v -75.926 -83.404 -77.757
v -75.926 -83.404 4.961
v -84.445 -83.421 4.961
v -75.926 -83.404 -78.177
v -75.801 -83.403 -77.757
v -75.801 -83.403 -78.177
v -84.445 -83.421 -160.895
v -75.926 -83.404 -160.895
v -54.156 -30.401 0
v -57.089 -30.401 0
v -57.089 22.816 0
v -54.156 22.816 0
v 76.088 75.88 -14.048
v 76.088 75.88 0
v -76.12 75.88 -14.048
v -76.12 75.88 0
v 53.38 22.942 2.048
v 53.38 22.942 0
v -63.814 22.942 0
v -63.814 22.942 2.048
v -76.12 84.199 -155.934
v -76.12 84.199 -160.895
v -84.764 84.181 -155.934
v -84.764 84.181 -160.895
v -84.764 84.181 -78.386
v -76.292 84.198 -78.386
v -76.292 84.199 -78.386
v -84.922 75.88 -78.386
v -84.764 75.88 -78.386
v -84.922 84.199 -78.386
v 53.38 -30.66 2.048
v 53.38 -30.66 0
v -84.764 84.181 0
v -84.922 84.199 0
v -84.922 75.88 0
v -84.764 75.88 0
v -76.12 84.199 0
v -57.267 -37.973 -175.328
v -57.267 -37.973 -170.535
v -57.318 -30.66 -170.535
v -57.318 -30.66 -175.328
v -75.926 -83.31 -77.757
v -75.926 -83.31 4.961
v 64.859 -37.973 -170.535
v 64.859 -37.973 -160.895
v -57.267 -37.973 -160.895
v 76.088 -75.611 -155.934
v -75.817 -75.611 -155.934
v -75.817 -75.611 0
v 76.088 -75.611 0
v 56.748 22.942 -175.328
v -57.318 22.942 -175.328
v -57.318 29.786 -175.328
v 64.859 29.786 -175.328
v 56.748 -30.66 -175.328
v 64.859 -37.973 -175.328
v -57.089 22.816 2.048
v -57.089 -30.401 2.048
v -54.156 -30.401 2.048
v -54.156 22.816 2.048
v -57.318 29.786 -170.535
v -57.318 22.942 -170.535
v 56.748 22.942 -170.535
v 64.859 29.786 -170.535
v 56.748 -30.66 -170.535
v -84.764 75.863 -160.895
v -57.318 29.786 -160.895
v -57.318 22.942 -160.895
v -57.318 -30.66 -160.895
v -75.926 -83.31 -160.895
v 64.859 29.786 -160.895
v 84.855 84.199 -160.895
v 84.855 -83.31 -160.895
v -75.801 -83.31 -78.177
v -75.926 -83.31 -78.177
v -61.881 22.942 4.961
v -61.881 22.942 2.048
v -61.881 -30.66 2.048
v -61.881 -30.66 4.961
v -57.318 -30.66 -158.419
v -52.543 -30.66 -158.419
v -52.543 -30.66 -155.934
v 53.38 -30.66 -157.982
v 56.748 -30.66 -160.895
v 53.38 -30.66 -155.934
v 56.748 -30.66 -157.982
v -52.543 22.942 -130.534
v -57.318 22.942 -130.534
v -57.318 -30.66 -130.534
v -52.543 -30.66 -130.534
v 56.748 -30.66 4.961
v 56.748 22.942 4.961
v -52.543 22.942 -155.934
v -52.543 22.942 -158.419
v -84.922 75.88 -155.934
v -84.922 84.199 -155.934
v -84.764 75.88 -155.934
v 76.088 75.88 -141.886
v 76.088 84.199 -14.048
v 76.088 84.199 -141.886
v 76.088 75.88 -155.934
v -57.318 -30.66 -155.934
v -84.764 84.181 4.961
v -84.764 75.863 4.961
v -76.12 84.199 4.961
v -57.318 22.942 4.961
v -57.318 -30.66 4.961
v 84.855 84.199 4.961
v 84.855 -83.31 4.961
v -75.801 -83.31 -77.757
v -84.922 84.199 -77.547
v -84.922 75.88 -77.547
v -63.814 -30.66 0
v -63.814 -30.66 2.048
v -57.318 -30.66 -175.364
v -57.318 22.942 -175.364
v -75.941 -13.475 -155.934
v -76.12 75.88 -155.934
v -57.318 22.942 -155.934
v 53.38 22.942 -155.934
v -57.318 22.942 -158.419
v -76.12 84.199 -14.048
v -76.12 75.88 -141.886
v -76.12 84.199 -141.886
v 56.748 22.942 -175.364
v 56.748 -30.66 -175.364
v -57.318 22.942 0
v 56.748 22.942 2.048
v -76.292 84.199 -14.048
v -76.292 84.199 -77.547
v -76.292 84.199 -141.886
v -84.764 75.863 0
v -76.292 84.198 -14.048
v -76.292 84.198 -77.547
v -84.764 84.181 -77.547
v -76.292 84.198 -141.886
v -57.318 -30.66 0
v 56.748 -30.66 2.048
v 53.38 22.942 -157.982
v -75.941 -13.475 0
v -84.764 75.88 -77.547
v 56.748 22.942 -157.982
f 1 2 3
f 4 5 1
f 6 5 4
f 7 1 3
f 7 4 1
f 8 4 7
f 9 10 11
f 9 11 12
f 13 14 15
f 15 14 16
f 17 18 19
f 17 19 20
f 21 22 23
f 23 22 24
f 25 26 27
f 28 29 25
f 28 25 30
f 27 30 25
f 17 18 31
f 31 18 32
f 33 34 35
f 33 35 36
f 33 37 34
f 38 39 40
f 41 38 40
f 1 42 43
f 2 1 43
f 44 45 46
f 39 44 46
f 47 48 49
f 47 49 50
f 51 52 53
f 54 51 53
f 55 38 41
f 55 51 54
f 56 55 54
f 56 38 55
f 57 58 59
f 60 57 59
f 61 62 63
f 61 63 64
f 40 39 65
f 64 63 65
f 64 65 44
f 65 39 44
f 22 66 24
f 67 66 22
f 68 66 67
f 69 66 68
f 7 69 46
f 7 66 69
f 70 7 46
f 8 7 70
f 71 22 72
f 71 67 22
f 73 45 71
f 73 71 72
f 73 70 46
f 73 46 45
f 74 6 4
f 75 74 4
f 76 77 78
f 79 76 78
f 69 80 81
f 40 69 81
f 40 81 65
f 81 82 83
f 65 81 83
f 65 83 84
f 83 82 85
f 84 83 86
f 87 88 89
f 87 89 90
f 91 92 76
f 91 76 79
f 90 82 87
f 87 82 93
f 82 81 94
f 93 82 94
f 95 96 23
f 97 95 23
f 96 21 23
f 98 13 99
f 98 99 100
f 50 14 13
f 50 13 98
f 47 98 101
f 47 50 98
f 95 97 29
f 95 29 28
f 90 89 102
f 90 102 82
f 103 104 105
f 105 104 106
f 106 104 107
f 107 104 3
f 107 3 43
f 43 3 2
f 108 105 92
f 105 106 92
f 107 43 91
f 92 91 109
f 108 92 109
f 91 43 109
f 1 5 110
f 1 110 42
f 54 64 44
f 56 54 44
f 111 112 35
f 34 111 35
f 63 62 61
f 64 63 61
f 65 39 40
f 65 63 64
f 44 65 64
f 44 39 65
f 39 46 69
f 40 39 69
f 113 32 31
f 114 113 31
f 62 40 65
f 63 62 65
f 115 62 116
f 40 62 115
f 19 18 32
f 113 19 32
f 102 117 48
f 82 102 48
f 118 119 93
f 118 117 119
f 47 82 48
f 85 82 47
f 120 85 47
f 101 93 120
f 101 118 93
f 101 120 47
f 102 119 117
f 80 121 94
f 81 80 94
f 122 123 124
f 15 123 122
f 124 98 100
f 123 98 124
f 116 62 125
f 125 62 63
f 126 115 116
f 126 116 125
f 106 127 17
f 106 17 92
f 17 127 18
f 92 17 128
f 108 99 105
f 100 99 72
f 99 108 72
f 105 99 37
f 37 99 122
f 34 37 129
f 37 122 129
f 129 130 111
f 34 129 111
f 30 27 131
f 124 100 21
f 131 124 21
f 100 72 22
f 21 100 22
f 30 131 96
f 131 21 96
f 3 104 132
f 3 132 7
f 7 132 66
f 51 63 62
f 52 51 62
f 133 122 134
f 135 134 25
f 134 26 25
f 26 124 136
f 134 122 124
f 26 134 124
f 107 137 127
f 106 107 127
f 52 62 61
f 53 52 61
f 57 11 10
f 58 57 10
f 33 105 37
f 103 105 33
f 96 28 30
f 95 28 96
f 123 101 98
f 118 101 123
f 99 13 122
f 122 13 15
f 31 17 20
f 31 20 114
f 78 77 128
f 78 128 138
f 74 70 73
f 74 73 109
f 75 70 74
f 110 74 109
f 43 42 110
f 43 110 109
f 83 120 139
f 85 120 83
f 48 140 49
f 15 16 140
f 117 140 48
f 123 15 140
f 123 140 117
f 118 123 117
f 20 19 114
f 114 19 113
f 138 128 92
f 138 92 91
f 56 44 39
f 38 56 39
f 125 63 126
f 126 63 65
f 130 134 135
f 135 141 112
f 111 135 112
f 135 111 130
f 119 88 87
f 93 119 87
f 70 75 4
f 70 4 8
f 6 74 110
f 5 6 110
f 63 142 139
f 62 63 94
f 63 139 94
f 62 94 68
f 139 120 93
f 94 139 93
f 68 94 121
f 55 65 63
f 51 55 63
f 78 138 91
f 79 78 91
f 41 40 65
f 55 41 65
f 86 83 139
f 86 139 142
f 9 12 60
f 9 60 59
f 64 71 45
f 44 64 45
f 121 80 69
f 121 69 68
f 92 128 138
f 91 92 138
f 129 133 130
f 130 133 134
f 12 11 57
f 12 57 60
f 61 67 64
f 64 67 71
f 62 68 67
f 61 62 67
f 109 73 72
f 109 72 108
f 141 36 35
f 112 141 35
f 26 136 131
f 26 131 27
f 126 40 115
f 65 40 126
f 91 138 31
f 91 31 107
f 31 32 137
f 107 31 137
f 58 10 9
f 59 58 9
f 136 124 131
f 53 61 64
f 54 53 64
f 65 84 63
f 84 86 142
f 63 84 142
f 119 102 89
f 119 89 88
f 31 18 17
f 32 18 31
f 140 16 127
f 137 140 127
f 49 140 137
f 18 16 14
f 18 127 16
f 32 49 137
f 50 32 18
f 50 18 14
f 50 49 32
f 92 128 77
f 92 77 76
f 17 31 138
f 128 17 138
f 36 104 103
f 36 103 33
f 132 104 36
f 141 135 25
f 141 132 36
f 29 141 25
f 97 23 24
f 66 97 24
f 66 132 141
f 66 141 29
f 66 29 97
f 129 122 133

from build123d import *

# Parameters (mm, degrees)
F1_DEPTH       = 4.9610938877
F2_DEPTH       = 36.2845510244
F3_DEPTH       = 28.2983873039
F6_W           = 152.0289778709
F6_H           = 77.9667943716
F6_H_2         = 4.9610938877
F7_DEPTH       = 7.698206231
F5_W           = 89.3552458436
F5_H           = 4.9610938877
F8_DEPTH       = 8.6439009756
F4_W           = 151.4917612076
F4_H           = 78.0786424875
F4_H_2         = 4.9610938877
F9_DEPTH       = 8.7674502283
F11_DEPTH      = 7.6351538301
F14_DEPTH      = 8.318213746
F16_W          = 2.9331818223
F16_H          = 53.2167684287
F17_DEPTH      = 2.0480365492
F15_W          = 3.3681131899
F15_H          = 53.6021273583
F19_DEPTH      = 117.1940714121
F20_DEPTH      = 118.6289340258
F22_DEPTH      = 9.6406843513
F23_W          = 114.0664964914
F23_H          = 53.6021273583
F24_DEPTH      = 4.8288311809
F25_DEPTH      = 4.7923792154
F26_W          = 4.7755762935
F26_H          = 53.6021273583
F27_DEPTH      = 2.485699486
F27_DEPTH_BACK = 25.4


with BuildPart() as f1:
    # F0 (on Top) → F1 (new body)
    with BuildSketch(Plane.XY):
        Polygon((-76.1202722788, 75.8803635836), (-75.9412050247, -13.4747028351), (-75.9412050247, -75.611397624), (76.0877728462, -75.611397624), (76.0877728462, 75.8803635836), align=None)
        Polygon((-57.3181062937, -58.9580535889), (-57.3181062937, -13.4747028351), (-57.3181062937, 59.2270120978), (56.7483901978, 59.2270120978), (56.7483901978, -58.9580535889), align=None, mode=Mode.SUBTRACT)
    extrude(amount=F1_DEPTH)

    # F2 (add): a face of the model
    f2_faces = [f1.faces().sort_by_distance(p)[0] for p in [
        (-0.284858048, 59.2270120978, 2.4805469438),
    ]]
    extrude(f2_faces, amount=F2_DEPTH)

    # F3 (add): a face of the model
    f3_faces = [f1.faces().sort_by_distance(p)[0] for p in [
        (-0.284858048, -58.9580535889, 2.4805469438),
    ]]
    extrude(f3_faces, amount=F3_DEPTH)

    # F6 (on face) → F7 (join)
    with BuildSketch(Plane.XZ.offset(75.611397624)):
        with Locations((0.0732839108, -38.9833971858)):
            Rectangle(F6_W, F6_H)
        with Locations((0.0732839108, 2.4805469438)):
            Rectangle(F6_W, F6_H_2)
    extrude(amount=F7_DEPTH)

    # F5 (on face) → F8 (join)
    with BuildSketch(Plane(origin=(-75.9679031968, -0.1522394238, 0), x_dir=(0.0020039926, -0.999997992, 0), z_dir=(-0.999997992, -0.0020039926, 0))):
        Polygon((75.6161287427, 4.9610938877), (13.3224901628, 4.9610938877), (13.3224901628, 0), (-76.0327556807, 0), (-76.0327556807, -78.1766921282), (75.6161287427, -78.1766921282), align=None)
        with Locations((-31.355132759, 2.4805469438)):
            Rectangle(F5_W, F5_H)
    extrude(amount=F8_DEPTH)

    # F4 (on face) + F7_face (on face) → F9 (join)
    with BuildSketch(Plane.YZ.offset(76.0877728462)):
        with Locations((0.1344829798, -39.0393212438)):
            Rectangle(F4_W, F4_H)
        with Locations((0.1344829798, 2.4805469438)):
            Rectangle(F4_W, F4_H_2)
    with BuildSketch(Plane(origin=(76.0877728462, -36.4227471096, -15.4241620465), x_dir=(0, 1, 0), z_dir=(1, 0, 0))):
        Polygon((112.3031106931, 15.4241620465), (112.3031106931, 20.3852559342), (-46.8868567455, 20.3852559342), (-46.8868567455, -62.5426323251), (-39.1886505145, -62.5426323251), (-39.1886505145, 15.4241620465), align=None)
    extrude(amount=F9_DEPTH)

    # F11 (add): a face of the model
    f11_faces = [f1.faces().sort_by_distance(p)[0] for p in [
        (-80.2005689479, -75.7770022516, -36.6093330754),
    ]]
    extrude(f11_faces, amount=F11_DEPTH)

    # F12 (on face) + F13 (on face) + F8_face1 (on face) → F14 (join)
    with BuildSketch(Plane(origin=(0, 75.8803635836, 0), x_dir=(-1, 0, 0), z_dir=(0, 1, 0))):
        Polygon((-76.0877728462, 0), (76.1202722788, 0), (76.1202722788, 4.9610938877), (-84.8552230746, 4.9610938877), (-84.8552230746, -78.0786424875), (-76.0877728462, -78.0786424875), align=None)
    with BuildSketch(Plane(origin=(0, 75.8803635836, 0), x_dir=(-1, 0, 0), z_dir=(0, 1, 0))):
        Polygon((76.1202722788, 0), (0, 0), (-76.0877728462, 0), (-76.0877728462, -14.047597535), (76.2922167778, -14.047597535), (76.2922167778, -77.5474458933), (84.9216878414, -77.5474458933), (84.9216878414, 0), align=None)
    with BuildSketch(Plane(origin=(-80.4422140881, 75.8717024266, -36.6077991202), x_dir=(-0.999997992, -0.0020039926, 0), z_dir=(-0.0020039926, 0.999997992, 0))):
        Polygon((4.3219504878, 41.5688930079), (-4.3219504878, 41.5688930079), (-4.3219504878, 36.6077991202), (-4.3219504878, -41.5688930079), (4.3219504878, -41.5688930079), align=None)
    extrude(amount=F14_DEPTH, dir=(0, 1, 0))

    # F15 (on face) → F17, piece 2 (join)
    with BuildSketch(Plane(origin=(0, 0, 0), x_dir=(1, 0, 0), z_dir=(0, 0, -1))):
        with Locations((55.0643336028, 3.8586026058)):
            Rectangle(F15_W, F15_H)
    extrude(amount=-F17_DEPTH)

    # F18: F1 across face


with BuildPart() as f17:
    # F16 (on face) → F17 (new body)
    with BuildSketch(Plane(origin=(0, 0, 0), x_dir=(1, 0, 0), z_dir=(0, 0, -1))):
        with Locations((-55.6225664914, 3.7924619392)):
            Rectangle(F16_W, F16_H)
    extrude(amount=-F17_DEPTH)


with BuildPart() as f1_1:
    add(f1.part)
    add(f1.part.mirror(Plane(origin=(4.5231266223, -79.4604391402, -77.9667943716), x_dir=(1, 0, 0), z_dir=(0, 0, -1))))


with BuildPart() as f19:
    # F19 (new): a face of the model
    f19_faces = [f1_1.part.faces().sort_by_distance(p)[0] for p in [
        (53.3802770078, -3.8586026058, 1.0240182746),
    ]]
    extrude(f19_faces, amount=F19_DEPTH)


with BuildPart() as f20:
    # F20 (new): a face of the model
    f20_faces = [f1_1.part.faces().sort_by_distance(p)[0] for p in [
        (56.7483901978, -3.8586026058, 3.5045652185),
    ]]
    extrude(f20_faces, amount=F20_DEPTH)


with BuildPart() as f1_2:
    add(f1_1.part)

    # F21 (on face) → F22 (join)
    with BuildSketch(Plane(origin=(0, 0, -160.8946826309), x_dir=(1, 0, 0), z_dir=(0, 0, -1))):
        Polygon((-57.3181062937, 30.6596662849), (56.7483901978, 30.6596662849), (56.7483901978, 37.9734002054), (-57.26660043, 37.9734002054), align=None)
        Polygon((56.7483901978, 37.9734002054), (56.7483901978, 30.6596662849), (56.7483901978, -22.9424610734), (-57.3181062937, -22.9424610734), (-57.3181062937, -29.7861658037), (64.8588240147, -29.7861658037), (64.8588240147, 37.9734002054), align=None)
    extrude(amount=F22_DEPTH)


with BuildPart() as f24:
    # F23 (on face) → F24 (new body)
    with BuildSketch(Plane(origin=(0, 0, -170.5353669822), x_dir=(1, 0, 0), z_dir=(0, 0, -1))):
        with Locations((-0.284858048, 3.8586026058)):
            Rectangle(F23_W, F23_H)
    extrude(amount=F24_DEPTH)


with BuildPart() as f25:
    # F25 (new): a face of the model
    f25_faces = [f1_2.part.faces().sort_by_distance(p)[0] for p in [
        (-0.284858048, -32.0567547247, -170.5353669822),
    ]]
    extrude(f25_faces, amount=F25_DEPTH)


with BuildPart() as f1_3:
    add(f1_2.part)

    # F26 (on face) → F27 (join, two sides)
    with BuildSketch(Plane.XY.offset(-155.9335887432)) as f27_sk:
        with Locations((-54.9303181469, -3.8586026058)):
            Rectangle(F26_W, F26_H)
    extrude(amount=-F27_DEPTH)
    extrude(f27_sk.sketch, amount=F27_DEPTH_BACK)


solid = Compound([f17.part, f19.part, f20.part, f24.part, f25.part, f1_3.part])
